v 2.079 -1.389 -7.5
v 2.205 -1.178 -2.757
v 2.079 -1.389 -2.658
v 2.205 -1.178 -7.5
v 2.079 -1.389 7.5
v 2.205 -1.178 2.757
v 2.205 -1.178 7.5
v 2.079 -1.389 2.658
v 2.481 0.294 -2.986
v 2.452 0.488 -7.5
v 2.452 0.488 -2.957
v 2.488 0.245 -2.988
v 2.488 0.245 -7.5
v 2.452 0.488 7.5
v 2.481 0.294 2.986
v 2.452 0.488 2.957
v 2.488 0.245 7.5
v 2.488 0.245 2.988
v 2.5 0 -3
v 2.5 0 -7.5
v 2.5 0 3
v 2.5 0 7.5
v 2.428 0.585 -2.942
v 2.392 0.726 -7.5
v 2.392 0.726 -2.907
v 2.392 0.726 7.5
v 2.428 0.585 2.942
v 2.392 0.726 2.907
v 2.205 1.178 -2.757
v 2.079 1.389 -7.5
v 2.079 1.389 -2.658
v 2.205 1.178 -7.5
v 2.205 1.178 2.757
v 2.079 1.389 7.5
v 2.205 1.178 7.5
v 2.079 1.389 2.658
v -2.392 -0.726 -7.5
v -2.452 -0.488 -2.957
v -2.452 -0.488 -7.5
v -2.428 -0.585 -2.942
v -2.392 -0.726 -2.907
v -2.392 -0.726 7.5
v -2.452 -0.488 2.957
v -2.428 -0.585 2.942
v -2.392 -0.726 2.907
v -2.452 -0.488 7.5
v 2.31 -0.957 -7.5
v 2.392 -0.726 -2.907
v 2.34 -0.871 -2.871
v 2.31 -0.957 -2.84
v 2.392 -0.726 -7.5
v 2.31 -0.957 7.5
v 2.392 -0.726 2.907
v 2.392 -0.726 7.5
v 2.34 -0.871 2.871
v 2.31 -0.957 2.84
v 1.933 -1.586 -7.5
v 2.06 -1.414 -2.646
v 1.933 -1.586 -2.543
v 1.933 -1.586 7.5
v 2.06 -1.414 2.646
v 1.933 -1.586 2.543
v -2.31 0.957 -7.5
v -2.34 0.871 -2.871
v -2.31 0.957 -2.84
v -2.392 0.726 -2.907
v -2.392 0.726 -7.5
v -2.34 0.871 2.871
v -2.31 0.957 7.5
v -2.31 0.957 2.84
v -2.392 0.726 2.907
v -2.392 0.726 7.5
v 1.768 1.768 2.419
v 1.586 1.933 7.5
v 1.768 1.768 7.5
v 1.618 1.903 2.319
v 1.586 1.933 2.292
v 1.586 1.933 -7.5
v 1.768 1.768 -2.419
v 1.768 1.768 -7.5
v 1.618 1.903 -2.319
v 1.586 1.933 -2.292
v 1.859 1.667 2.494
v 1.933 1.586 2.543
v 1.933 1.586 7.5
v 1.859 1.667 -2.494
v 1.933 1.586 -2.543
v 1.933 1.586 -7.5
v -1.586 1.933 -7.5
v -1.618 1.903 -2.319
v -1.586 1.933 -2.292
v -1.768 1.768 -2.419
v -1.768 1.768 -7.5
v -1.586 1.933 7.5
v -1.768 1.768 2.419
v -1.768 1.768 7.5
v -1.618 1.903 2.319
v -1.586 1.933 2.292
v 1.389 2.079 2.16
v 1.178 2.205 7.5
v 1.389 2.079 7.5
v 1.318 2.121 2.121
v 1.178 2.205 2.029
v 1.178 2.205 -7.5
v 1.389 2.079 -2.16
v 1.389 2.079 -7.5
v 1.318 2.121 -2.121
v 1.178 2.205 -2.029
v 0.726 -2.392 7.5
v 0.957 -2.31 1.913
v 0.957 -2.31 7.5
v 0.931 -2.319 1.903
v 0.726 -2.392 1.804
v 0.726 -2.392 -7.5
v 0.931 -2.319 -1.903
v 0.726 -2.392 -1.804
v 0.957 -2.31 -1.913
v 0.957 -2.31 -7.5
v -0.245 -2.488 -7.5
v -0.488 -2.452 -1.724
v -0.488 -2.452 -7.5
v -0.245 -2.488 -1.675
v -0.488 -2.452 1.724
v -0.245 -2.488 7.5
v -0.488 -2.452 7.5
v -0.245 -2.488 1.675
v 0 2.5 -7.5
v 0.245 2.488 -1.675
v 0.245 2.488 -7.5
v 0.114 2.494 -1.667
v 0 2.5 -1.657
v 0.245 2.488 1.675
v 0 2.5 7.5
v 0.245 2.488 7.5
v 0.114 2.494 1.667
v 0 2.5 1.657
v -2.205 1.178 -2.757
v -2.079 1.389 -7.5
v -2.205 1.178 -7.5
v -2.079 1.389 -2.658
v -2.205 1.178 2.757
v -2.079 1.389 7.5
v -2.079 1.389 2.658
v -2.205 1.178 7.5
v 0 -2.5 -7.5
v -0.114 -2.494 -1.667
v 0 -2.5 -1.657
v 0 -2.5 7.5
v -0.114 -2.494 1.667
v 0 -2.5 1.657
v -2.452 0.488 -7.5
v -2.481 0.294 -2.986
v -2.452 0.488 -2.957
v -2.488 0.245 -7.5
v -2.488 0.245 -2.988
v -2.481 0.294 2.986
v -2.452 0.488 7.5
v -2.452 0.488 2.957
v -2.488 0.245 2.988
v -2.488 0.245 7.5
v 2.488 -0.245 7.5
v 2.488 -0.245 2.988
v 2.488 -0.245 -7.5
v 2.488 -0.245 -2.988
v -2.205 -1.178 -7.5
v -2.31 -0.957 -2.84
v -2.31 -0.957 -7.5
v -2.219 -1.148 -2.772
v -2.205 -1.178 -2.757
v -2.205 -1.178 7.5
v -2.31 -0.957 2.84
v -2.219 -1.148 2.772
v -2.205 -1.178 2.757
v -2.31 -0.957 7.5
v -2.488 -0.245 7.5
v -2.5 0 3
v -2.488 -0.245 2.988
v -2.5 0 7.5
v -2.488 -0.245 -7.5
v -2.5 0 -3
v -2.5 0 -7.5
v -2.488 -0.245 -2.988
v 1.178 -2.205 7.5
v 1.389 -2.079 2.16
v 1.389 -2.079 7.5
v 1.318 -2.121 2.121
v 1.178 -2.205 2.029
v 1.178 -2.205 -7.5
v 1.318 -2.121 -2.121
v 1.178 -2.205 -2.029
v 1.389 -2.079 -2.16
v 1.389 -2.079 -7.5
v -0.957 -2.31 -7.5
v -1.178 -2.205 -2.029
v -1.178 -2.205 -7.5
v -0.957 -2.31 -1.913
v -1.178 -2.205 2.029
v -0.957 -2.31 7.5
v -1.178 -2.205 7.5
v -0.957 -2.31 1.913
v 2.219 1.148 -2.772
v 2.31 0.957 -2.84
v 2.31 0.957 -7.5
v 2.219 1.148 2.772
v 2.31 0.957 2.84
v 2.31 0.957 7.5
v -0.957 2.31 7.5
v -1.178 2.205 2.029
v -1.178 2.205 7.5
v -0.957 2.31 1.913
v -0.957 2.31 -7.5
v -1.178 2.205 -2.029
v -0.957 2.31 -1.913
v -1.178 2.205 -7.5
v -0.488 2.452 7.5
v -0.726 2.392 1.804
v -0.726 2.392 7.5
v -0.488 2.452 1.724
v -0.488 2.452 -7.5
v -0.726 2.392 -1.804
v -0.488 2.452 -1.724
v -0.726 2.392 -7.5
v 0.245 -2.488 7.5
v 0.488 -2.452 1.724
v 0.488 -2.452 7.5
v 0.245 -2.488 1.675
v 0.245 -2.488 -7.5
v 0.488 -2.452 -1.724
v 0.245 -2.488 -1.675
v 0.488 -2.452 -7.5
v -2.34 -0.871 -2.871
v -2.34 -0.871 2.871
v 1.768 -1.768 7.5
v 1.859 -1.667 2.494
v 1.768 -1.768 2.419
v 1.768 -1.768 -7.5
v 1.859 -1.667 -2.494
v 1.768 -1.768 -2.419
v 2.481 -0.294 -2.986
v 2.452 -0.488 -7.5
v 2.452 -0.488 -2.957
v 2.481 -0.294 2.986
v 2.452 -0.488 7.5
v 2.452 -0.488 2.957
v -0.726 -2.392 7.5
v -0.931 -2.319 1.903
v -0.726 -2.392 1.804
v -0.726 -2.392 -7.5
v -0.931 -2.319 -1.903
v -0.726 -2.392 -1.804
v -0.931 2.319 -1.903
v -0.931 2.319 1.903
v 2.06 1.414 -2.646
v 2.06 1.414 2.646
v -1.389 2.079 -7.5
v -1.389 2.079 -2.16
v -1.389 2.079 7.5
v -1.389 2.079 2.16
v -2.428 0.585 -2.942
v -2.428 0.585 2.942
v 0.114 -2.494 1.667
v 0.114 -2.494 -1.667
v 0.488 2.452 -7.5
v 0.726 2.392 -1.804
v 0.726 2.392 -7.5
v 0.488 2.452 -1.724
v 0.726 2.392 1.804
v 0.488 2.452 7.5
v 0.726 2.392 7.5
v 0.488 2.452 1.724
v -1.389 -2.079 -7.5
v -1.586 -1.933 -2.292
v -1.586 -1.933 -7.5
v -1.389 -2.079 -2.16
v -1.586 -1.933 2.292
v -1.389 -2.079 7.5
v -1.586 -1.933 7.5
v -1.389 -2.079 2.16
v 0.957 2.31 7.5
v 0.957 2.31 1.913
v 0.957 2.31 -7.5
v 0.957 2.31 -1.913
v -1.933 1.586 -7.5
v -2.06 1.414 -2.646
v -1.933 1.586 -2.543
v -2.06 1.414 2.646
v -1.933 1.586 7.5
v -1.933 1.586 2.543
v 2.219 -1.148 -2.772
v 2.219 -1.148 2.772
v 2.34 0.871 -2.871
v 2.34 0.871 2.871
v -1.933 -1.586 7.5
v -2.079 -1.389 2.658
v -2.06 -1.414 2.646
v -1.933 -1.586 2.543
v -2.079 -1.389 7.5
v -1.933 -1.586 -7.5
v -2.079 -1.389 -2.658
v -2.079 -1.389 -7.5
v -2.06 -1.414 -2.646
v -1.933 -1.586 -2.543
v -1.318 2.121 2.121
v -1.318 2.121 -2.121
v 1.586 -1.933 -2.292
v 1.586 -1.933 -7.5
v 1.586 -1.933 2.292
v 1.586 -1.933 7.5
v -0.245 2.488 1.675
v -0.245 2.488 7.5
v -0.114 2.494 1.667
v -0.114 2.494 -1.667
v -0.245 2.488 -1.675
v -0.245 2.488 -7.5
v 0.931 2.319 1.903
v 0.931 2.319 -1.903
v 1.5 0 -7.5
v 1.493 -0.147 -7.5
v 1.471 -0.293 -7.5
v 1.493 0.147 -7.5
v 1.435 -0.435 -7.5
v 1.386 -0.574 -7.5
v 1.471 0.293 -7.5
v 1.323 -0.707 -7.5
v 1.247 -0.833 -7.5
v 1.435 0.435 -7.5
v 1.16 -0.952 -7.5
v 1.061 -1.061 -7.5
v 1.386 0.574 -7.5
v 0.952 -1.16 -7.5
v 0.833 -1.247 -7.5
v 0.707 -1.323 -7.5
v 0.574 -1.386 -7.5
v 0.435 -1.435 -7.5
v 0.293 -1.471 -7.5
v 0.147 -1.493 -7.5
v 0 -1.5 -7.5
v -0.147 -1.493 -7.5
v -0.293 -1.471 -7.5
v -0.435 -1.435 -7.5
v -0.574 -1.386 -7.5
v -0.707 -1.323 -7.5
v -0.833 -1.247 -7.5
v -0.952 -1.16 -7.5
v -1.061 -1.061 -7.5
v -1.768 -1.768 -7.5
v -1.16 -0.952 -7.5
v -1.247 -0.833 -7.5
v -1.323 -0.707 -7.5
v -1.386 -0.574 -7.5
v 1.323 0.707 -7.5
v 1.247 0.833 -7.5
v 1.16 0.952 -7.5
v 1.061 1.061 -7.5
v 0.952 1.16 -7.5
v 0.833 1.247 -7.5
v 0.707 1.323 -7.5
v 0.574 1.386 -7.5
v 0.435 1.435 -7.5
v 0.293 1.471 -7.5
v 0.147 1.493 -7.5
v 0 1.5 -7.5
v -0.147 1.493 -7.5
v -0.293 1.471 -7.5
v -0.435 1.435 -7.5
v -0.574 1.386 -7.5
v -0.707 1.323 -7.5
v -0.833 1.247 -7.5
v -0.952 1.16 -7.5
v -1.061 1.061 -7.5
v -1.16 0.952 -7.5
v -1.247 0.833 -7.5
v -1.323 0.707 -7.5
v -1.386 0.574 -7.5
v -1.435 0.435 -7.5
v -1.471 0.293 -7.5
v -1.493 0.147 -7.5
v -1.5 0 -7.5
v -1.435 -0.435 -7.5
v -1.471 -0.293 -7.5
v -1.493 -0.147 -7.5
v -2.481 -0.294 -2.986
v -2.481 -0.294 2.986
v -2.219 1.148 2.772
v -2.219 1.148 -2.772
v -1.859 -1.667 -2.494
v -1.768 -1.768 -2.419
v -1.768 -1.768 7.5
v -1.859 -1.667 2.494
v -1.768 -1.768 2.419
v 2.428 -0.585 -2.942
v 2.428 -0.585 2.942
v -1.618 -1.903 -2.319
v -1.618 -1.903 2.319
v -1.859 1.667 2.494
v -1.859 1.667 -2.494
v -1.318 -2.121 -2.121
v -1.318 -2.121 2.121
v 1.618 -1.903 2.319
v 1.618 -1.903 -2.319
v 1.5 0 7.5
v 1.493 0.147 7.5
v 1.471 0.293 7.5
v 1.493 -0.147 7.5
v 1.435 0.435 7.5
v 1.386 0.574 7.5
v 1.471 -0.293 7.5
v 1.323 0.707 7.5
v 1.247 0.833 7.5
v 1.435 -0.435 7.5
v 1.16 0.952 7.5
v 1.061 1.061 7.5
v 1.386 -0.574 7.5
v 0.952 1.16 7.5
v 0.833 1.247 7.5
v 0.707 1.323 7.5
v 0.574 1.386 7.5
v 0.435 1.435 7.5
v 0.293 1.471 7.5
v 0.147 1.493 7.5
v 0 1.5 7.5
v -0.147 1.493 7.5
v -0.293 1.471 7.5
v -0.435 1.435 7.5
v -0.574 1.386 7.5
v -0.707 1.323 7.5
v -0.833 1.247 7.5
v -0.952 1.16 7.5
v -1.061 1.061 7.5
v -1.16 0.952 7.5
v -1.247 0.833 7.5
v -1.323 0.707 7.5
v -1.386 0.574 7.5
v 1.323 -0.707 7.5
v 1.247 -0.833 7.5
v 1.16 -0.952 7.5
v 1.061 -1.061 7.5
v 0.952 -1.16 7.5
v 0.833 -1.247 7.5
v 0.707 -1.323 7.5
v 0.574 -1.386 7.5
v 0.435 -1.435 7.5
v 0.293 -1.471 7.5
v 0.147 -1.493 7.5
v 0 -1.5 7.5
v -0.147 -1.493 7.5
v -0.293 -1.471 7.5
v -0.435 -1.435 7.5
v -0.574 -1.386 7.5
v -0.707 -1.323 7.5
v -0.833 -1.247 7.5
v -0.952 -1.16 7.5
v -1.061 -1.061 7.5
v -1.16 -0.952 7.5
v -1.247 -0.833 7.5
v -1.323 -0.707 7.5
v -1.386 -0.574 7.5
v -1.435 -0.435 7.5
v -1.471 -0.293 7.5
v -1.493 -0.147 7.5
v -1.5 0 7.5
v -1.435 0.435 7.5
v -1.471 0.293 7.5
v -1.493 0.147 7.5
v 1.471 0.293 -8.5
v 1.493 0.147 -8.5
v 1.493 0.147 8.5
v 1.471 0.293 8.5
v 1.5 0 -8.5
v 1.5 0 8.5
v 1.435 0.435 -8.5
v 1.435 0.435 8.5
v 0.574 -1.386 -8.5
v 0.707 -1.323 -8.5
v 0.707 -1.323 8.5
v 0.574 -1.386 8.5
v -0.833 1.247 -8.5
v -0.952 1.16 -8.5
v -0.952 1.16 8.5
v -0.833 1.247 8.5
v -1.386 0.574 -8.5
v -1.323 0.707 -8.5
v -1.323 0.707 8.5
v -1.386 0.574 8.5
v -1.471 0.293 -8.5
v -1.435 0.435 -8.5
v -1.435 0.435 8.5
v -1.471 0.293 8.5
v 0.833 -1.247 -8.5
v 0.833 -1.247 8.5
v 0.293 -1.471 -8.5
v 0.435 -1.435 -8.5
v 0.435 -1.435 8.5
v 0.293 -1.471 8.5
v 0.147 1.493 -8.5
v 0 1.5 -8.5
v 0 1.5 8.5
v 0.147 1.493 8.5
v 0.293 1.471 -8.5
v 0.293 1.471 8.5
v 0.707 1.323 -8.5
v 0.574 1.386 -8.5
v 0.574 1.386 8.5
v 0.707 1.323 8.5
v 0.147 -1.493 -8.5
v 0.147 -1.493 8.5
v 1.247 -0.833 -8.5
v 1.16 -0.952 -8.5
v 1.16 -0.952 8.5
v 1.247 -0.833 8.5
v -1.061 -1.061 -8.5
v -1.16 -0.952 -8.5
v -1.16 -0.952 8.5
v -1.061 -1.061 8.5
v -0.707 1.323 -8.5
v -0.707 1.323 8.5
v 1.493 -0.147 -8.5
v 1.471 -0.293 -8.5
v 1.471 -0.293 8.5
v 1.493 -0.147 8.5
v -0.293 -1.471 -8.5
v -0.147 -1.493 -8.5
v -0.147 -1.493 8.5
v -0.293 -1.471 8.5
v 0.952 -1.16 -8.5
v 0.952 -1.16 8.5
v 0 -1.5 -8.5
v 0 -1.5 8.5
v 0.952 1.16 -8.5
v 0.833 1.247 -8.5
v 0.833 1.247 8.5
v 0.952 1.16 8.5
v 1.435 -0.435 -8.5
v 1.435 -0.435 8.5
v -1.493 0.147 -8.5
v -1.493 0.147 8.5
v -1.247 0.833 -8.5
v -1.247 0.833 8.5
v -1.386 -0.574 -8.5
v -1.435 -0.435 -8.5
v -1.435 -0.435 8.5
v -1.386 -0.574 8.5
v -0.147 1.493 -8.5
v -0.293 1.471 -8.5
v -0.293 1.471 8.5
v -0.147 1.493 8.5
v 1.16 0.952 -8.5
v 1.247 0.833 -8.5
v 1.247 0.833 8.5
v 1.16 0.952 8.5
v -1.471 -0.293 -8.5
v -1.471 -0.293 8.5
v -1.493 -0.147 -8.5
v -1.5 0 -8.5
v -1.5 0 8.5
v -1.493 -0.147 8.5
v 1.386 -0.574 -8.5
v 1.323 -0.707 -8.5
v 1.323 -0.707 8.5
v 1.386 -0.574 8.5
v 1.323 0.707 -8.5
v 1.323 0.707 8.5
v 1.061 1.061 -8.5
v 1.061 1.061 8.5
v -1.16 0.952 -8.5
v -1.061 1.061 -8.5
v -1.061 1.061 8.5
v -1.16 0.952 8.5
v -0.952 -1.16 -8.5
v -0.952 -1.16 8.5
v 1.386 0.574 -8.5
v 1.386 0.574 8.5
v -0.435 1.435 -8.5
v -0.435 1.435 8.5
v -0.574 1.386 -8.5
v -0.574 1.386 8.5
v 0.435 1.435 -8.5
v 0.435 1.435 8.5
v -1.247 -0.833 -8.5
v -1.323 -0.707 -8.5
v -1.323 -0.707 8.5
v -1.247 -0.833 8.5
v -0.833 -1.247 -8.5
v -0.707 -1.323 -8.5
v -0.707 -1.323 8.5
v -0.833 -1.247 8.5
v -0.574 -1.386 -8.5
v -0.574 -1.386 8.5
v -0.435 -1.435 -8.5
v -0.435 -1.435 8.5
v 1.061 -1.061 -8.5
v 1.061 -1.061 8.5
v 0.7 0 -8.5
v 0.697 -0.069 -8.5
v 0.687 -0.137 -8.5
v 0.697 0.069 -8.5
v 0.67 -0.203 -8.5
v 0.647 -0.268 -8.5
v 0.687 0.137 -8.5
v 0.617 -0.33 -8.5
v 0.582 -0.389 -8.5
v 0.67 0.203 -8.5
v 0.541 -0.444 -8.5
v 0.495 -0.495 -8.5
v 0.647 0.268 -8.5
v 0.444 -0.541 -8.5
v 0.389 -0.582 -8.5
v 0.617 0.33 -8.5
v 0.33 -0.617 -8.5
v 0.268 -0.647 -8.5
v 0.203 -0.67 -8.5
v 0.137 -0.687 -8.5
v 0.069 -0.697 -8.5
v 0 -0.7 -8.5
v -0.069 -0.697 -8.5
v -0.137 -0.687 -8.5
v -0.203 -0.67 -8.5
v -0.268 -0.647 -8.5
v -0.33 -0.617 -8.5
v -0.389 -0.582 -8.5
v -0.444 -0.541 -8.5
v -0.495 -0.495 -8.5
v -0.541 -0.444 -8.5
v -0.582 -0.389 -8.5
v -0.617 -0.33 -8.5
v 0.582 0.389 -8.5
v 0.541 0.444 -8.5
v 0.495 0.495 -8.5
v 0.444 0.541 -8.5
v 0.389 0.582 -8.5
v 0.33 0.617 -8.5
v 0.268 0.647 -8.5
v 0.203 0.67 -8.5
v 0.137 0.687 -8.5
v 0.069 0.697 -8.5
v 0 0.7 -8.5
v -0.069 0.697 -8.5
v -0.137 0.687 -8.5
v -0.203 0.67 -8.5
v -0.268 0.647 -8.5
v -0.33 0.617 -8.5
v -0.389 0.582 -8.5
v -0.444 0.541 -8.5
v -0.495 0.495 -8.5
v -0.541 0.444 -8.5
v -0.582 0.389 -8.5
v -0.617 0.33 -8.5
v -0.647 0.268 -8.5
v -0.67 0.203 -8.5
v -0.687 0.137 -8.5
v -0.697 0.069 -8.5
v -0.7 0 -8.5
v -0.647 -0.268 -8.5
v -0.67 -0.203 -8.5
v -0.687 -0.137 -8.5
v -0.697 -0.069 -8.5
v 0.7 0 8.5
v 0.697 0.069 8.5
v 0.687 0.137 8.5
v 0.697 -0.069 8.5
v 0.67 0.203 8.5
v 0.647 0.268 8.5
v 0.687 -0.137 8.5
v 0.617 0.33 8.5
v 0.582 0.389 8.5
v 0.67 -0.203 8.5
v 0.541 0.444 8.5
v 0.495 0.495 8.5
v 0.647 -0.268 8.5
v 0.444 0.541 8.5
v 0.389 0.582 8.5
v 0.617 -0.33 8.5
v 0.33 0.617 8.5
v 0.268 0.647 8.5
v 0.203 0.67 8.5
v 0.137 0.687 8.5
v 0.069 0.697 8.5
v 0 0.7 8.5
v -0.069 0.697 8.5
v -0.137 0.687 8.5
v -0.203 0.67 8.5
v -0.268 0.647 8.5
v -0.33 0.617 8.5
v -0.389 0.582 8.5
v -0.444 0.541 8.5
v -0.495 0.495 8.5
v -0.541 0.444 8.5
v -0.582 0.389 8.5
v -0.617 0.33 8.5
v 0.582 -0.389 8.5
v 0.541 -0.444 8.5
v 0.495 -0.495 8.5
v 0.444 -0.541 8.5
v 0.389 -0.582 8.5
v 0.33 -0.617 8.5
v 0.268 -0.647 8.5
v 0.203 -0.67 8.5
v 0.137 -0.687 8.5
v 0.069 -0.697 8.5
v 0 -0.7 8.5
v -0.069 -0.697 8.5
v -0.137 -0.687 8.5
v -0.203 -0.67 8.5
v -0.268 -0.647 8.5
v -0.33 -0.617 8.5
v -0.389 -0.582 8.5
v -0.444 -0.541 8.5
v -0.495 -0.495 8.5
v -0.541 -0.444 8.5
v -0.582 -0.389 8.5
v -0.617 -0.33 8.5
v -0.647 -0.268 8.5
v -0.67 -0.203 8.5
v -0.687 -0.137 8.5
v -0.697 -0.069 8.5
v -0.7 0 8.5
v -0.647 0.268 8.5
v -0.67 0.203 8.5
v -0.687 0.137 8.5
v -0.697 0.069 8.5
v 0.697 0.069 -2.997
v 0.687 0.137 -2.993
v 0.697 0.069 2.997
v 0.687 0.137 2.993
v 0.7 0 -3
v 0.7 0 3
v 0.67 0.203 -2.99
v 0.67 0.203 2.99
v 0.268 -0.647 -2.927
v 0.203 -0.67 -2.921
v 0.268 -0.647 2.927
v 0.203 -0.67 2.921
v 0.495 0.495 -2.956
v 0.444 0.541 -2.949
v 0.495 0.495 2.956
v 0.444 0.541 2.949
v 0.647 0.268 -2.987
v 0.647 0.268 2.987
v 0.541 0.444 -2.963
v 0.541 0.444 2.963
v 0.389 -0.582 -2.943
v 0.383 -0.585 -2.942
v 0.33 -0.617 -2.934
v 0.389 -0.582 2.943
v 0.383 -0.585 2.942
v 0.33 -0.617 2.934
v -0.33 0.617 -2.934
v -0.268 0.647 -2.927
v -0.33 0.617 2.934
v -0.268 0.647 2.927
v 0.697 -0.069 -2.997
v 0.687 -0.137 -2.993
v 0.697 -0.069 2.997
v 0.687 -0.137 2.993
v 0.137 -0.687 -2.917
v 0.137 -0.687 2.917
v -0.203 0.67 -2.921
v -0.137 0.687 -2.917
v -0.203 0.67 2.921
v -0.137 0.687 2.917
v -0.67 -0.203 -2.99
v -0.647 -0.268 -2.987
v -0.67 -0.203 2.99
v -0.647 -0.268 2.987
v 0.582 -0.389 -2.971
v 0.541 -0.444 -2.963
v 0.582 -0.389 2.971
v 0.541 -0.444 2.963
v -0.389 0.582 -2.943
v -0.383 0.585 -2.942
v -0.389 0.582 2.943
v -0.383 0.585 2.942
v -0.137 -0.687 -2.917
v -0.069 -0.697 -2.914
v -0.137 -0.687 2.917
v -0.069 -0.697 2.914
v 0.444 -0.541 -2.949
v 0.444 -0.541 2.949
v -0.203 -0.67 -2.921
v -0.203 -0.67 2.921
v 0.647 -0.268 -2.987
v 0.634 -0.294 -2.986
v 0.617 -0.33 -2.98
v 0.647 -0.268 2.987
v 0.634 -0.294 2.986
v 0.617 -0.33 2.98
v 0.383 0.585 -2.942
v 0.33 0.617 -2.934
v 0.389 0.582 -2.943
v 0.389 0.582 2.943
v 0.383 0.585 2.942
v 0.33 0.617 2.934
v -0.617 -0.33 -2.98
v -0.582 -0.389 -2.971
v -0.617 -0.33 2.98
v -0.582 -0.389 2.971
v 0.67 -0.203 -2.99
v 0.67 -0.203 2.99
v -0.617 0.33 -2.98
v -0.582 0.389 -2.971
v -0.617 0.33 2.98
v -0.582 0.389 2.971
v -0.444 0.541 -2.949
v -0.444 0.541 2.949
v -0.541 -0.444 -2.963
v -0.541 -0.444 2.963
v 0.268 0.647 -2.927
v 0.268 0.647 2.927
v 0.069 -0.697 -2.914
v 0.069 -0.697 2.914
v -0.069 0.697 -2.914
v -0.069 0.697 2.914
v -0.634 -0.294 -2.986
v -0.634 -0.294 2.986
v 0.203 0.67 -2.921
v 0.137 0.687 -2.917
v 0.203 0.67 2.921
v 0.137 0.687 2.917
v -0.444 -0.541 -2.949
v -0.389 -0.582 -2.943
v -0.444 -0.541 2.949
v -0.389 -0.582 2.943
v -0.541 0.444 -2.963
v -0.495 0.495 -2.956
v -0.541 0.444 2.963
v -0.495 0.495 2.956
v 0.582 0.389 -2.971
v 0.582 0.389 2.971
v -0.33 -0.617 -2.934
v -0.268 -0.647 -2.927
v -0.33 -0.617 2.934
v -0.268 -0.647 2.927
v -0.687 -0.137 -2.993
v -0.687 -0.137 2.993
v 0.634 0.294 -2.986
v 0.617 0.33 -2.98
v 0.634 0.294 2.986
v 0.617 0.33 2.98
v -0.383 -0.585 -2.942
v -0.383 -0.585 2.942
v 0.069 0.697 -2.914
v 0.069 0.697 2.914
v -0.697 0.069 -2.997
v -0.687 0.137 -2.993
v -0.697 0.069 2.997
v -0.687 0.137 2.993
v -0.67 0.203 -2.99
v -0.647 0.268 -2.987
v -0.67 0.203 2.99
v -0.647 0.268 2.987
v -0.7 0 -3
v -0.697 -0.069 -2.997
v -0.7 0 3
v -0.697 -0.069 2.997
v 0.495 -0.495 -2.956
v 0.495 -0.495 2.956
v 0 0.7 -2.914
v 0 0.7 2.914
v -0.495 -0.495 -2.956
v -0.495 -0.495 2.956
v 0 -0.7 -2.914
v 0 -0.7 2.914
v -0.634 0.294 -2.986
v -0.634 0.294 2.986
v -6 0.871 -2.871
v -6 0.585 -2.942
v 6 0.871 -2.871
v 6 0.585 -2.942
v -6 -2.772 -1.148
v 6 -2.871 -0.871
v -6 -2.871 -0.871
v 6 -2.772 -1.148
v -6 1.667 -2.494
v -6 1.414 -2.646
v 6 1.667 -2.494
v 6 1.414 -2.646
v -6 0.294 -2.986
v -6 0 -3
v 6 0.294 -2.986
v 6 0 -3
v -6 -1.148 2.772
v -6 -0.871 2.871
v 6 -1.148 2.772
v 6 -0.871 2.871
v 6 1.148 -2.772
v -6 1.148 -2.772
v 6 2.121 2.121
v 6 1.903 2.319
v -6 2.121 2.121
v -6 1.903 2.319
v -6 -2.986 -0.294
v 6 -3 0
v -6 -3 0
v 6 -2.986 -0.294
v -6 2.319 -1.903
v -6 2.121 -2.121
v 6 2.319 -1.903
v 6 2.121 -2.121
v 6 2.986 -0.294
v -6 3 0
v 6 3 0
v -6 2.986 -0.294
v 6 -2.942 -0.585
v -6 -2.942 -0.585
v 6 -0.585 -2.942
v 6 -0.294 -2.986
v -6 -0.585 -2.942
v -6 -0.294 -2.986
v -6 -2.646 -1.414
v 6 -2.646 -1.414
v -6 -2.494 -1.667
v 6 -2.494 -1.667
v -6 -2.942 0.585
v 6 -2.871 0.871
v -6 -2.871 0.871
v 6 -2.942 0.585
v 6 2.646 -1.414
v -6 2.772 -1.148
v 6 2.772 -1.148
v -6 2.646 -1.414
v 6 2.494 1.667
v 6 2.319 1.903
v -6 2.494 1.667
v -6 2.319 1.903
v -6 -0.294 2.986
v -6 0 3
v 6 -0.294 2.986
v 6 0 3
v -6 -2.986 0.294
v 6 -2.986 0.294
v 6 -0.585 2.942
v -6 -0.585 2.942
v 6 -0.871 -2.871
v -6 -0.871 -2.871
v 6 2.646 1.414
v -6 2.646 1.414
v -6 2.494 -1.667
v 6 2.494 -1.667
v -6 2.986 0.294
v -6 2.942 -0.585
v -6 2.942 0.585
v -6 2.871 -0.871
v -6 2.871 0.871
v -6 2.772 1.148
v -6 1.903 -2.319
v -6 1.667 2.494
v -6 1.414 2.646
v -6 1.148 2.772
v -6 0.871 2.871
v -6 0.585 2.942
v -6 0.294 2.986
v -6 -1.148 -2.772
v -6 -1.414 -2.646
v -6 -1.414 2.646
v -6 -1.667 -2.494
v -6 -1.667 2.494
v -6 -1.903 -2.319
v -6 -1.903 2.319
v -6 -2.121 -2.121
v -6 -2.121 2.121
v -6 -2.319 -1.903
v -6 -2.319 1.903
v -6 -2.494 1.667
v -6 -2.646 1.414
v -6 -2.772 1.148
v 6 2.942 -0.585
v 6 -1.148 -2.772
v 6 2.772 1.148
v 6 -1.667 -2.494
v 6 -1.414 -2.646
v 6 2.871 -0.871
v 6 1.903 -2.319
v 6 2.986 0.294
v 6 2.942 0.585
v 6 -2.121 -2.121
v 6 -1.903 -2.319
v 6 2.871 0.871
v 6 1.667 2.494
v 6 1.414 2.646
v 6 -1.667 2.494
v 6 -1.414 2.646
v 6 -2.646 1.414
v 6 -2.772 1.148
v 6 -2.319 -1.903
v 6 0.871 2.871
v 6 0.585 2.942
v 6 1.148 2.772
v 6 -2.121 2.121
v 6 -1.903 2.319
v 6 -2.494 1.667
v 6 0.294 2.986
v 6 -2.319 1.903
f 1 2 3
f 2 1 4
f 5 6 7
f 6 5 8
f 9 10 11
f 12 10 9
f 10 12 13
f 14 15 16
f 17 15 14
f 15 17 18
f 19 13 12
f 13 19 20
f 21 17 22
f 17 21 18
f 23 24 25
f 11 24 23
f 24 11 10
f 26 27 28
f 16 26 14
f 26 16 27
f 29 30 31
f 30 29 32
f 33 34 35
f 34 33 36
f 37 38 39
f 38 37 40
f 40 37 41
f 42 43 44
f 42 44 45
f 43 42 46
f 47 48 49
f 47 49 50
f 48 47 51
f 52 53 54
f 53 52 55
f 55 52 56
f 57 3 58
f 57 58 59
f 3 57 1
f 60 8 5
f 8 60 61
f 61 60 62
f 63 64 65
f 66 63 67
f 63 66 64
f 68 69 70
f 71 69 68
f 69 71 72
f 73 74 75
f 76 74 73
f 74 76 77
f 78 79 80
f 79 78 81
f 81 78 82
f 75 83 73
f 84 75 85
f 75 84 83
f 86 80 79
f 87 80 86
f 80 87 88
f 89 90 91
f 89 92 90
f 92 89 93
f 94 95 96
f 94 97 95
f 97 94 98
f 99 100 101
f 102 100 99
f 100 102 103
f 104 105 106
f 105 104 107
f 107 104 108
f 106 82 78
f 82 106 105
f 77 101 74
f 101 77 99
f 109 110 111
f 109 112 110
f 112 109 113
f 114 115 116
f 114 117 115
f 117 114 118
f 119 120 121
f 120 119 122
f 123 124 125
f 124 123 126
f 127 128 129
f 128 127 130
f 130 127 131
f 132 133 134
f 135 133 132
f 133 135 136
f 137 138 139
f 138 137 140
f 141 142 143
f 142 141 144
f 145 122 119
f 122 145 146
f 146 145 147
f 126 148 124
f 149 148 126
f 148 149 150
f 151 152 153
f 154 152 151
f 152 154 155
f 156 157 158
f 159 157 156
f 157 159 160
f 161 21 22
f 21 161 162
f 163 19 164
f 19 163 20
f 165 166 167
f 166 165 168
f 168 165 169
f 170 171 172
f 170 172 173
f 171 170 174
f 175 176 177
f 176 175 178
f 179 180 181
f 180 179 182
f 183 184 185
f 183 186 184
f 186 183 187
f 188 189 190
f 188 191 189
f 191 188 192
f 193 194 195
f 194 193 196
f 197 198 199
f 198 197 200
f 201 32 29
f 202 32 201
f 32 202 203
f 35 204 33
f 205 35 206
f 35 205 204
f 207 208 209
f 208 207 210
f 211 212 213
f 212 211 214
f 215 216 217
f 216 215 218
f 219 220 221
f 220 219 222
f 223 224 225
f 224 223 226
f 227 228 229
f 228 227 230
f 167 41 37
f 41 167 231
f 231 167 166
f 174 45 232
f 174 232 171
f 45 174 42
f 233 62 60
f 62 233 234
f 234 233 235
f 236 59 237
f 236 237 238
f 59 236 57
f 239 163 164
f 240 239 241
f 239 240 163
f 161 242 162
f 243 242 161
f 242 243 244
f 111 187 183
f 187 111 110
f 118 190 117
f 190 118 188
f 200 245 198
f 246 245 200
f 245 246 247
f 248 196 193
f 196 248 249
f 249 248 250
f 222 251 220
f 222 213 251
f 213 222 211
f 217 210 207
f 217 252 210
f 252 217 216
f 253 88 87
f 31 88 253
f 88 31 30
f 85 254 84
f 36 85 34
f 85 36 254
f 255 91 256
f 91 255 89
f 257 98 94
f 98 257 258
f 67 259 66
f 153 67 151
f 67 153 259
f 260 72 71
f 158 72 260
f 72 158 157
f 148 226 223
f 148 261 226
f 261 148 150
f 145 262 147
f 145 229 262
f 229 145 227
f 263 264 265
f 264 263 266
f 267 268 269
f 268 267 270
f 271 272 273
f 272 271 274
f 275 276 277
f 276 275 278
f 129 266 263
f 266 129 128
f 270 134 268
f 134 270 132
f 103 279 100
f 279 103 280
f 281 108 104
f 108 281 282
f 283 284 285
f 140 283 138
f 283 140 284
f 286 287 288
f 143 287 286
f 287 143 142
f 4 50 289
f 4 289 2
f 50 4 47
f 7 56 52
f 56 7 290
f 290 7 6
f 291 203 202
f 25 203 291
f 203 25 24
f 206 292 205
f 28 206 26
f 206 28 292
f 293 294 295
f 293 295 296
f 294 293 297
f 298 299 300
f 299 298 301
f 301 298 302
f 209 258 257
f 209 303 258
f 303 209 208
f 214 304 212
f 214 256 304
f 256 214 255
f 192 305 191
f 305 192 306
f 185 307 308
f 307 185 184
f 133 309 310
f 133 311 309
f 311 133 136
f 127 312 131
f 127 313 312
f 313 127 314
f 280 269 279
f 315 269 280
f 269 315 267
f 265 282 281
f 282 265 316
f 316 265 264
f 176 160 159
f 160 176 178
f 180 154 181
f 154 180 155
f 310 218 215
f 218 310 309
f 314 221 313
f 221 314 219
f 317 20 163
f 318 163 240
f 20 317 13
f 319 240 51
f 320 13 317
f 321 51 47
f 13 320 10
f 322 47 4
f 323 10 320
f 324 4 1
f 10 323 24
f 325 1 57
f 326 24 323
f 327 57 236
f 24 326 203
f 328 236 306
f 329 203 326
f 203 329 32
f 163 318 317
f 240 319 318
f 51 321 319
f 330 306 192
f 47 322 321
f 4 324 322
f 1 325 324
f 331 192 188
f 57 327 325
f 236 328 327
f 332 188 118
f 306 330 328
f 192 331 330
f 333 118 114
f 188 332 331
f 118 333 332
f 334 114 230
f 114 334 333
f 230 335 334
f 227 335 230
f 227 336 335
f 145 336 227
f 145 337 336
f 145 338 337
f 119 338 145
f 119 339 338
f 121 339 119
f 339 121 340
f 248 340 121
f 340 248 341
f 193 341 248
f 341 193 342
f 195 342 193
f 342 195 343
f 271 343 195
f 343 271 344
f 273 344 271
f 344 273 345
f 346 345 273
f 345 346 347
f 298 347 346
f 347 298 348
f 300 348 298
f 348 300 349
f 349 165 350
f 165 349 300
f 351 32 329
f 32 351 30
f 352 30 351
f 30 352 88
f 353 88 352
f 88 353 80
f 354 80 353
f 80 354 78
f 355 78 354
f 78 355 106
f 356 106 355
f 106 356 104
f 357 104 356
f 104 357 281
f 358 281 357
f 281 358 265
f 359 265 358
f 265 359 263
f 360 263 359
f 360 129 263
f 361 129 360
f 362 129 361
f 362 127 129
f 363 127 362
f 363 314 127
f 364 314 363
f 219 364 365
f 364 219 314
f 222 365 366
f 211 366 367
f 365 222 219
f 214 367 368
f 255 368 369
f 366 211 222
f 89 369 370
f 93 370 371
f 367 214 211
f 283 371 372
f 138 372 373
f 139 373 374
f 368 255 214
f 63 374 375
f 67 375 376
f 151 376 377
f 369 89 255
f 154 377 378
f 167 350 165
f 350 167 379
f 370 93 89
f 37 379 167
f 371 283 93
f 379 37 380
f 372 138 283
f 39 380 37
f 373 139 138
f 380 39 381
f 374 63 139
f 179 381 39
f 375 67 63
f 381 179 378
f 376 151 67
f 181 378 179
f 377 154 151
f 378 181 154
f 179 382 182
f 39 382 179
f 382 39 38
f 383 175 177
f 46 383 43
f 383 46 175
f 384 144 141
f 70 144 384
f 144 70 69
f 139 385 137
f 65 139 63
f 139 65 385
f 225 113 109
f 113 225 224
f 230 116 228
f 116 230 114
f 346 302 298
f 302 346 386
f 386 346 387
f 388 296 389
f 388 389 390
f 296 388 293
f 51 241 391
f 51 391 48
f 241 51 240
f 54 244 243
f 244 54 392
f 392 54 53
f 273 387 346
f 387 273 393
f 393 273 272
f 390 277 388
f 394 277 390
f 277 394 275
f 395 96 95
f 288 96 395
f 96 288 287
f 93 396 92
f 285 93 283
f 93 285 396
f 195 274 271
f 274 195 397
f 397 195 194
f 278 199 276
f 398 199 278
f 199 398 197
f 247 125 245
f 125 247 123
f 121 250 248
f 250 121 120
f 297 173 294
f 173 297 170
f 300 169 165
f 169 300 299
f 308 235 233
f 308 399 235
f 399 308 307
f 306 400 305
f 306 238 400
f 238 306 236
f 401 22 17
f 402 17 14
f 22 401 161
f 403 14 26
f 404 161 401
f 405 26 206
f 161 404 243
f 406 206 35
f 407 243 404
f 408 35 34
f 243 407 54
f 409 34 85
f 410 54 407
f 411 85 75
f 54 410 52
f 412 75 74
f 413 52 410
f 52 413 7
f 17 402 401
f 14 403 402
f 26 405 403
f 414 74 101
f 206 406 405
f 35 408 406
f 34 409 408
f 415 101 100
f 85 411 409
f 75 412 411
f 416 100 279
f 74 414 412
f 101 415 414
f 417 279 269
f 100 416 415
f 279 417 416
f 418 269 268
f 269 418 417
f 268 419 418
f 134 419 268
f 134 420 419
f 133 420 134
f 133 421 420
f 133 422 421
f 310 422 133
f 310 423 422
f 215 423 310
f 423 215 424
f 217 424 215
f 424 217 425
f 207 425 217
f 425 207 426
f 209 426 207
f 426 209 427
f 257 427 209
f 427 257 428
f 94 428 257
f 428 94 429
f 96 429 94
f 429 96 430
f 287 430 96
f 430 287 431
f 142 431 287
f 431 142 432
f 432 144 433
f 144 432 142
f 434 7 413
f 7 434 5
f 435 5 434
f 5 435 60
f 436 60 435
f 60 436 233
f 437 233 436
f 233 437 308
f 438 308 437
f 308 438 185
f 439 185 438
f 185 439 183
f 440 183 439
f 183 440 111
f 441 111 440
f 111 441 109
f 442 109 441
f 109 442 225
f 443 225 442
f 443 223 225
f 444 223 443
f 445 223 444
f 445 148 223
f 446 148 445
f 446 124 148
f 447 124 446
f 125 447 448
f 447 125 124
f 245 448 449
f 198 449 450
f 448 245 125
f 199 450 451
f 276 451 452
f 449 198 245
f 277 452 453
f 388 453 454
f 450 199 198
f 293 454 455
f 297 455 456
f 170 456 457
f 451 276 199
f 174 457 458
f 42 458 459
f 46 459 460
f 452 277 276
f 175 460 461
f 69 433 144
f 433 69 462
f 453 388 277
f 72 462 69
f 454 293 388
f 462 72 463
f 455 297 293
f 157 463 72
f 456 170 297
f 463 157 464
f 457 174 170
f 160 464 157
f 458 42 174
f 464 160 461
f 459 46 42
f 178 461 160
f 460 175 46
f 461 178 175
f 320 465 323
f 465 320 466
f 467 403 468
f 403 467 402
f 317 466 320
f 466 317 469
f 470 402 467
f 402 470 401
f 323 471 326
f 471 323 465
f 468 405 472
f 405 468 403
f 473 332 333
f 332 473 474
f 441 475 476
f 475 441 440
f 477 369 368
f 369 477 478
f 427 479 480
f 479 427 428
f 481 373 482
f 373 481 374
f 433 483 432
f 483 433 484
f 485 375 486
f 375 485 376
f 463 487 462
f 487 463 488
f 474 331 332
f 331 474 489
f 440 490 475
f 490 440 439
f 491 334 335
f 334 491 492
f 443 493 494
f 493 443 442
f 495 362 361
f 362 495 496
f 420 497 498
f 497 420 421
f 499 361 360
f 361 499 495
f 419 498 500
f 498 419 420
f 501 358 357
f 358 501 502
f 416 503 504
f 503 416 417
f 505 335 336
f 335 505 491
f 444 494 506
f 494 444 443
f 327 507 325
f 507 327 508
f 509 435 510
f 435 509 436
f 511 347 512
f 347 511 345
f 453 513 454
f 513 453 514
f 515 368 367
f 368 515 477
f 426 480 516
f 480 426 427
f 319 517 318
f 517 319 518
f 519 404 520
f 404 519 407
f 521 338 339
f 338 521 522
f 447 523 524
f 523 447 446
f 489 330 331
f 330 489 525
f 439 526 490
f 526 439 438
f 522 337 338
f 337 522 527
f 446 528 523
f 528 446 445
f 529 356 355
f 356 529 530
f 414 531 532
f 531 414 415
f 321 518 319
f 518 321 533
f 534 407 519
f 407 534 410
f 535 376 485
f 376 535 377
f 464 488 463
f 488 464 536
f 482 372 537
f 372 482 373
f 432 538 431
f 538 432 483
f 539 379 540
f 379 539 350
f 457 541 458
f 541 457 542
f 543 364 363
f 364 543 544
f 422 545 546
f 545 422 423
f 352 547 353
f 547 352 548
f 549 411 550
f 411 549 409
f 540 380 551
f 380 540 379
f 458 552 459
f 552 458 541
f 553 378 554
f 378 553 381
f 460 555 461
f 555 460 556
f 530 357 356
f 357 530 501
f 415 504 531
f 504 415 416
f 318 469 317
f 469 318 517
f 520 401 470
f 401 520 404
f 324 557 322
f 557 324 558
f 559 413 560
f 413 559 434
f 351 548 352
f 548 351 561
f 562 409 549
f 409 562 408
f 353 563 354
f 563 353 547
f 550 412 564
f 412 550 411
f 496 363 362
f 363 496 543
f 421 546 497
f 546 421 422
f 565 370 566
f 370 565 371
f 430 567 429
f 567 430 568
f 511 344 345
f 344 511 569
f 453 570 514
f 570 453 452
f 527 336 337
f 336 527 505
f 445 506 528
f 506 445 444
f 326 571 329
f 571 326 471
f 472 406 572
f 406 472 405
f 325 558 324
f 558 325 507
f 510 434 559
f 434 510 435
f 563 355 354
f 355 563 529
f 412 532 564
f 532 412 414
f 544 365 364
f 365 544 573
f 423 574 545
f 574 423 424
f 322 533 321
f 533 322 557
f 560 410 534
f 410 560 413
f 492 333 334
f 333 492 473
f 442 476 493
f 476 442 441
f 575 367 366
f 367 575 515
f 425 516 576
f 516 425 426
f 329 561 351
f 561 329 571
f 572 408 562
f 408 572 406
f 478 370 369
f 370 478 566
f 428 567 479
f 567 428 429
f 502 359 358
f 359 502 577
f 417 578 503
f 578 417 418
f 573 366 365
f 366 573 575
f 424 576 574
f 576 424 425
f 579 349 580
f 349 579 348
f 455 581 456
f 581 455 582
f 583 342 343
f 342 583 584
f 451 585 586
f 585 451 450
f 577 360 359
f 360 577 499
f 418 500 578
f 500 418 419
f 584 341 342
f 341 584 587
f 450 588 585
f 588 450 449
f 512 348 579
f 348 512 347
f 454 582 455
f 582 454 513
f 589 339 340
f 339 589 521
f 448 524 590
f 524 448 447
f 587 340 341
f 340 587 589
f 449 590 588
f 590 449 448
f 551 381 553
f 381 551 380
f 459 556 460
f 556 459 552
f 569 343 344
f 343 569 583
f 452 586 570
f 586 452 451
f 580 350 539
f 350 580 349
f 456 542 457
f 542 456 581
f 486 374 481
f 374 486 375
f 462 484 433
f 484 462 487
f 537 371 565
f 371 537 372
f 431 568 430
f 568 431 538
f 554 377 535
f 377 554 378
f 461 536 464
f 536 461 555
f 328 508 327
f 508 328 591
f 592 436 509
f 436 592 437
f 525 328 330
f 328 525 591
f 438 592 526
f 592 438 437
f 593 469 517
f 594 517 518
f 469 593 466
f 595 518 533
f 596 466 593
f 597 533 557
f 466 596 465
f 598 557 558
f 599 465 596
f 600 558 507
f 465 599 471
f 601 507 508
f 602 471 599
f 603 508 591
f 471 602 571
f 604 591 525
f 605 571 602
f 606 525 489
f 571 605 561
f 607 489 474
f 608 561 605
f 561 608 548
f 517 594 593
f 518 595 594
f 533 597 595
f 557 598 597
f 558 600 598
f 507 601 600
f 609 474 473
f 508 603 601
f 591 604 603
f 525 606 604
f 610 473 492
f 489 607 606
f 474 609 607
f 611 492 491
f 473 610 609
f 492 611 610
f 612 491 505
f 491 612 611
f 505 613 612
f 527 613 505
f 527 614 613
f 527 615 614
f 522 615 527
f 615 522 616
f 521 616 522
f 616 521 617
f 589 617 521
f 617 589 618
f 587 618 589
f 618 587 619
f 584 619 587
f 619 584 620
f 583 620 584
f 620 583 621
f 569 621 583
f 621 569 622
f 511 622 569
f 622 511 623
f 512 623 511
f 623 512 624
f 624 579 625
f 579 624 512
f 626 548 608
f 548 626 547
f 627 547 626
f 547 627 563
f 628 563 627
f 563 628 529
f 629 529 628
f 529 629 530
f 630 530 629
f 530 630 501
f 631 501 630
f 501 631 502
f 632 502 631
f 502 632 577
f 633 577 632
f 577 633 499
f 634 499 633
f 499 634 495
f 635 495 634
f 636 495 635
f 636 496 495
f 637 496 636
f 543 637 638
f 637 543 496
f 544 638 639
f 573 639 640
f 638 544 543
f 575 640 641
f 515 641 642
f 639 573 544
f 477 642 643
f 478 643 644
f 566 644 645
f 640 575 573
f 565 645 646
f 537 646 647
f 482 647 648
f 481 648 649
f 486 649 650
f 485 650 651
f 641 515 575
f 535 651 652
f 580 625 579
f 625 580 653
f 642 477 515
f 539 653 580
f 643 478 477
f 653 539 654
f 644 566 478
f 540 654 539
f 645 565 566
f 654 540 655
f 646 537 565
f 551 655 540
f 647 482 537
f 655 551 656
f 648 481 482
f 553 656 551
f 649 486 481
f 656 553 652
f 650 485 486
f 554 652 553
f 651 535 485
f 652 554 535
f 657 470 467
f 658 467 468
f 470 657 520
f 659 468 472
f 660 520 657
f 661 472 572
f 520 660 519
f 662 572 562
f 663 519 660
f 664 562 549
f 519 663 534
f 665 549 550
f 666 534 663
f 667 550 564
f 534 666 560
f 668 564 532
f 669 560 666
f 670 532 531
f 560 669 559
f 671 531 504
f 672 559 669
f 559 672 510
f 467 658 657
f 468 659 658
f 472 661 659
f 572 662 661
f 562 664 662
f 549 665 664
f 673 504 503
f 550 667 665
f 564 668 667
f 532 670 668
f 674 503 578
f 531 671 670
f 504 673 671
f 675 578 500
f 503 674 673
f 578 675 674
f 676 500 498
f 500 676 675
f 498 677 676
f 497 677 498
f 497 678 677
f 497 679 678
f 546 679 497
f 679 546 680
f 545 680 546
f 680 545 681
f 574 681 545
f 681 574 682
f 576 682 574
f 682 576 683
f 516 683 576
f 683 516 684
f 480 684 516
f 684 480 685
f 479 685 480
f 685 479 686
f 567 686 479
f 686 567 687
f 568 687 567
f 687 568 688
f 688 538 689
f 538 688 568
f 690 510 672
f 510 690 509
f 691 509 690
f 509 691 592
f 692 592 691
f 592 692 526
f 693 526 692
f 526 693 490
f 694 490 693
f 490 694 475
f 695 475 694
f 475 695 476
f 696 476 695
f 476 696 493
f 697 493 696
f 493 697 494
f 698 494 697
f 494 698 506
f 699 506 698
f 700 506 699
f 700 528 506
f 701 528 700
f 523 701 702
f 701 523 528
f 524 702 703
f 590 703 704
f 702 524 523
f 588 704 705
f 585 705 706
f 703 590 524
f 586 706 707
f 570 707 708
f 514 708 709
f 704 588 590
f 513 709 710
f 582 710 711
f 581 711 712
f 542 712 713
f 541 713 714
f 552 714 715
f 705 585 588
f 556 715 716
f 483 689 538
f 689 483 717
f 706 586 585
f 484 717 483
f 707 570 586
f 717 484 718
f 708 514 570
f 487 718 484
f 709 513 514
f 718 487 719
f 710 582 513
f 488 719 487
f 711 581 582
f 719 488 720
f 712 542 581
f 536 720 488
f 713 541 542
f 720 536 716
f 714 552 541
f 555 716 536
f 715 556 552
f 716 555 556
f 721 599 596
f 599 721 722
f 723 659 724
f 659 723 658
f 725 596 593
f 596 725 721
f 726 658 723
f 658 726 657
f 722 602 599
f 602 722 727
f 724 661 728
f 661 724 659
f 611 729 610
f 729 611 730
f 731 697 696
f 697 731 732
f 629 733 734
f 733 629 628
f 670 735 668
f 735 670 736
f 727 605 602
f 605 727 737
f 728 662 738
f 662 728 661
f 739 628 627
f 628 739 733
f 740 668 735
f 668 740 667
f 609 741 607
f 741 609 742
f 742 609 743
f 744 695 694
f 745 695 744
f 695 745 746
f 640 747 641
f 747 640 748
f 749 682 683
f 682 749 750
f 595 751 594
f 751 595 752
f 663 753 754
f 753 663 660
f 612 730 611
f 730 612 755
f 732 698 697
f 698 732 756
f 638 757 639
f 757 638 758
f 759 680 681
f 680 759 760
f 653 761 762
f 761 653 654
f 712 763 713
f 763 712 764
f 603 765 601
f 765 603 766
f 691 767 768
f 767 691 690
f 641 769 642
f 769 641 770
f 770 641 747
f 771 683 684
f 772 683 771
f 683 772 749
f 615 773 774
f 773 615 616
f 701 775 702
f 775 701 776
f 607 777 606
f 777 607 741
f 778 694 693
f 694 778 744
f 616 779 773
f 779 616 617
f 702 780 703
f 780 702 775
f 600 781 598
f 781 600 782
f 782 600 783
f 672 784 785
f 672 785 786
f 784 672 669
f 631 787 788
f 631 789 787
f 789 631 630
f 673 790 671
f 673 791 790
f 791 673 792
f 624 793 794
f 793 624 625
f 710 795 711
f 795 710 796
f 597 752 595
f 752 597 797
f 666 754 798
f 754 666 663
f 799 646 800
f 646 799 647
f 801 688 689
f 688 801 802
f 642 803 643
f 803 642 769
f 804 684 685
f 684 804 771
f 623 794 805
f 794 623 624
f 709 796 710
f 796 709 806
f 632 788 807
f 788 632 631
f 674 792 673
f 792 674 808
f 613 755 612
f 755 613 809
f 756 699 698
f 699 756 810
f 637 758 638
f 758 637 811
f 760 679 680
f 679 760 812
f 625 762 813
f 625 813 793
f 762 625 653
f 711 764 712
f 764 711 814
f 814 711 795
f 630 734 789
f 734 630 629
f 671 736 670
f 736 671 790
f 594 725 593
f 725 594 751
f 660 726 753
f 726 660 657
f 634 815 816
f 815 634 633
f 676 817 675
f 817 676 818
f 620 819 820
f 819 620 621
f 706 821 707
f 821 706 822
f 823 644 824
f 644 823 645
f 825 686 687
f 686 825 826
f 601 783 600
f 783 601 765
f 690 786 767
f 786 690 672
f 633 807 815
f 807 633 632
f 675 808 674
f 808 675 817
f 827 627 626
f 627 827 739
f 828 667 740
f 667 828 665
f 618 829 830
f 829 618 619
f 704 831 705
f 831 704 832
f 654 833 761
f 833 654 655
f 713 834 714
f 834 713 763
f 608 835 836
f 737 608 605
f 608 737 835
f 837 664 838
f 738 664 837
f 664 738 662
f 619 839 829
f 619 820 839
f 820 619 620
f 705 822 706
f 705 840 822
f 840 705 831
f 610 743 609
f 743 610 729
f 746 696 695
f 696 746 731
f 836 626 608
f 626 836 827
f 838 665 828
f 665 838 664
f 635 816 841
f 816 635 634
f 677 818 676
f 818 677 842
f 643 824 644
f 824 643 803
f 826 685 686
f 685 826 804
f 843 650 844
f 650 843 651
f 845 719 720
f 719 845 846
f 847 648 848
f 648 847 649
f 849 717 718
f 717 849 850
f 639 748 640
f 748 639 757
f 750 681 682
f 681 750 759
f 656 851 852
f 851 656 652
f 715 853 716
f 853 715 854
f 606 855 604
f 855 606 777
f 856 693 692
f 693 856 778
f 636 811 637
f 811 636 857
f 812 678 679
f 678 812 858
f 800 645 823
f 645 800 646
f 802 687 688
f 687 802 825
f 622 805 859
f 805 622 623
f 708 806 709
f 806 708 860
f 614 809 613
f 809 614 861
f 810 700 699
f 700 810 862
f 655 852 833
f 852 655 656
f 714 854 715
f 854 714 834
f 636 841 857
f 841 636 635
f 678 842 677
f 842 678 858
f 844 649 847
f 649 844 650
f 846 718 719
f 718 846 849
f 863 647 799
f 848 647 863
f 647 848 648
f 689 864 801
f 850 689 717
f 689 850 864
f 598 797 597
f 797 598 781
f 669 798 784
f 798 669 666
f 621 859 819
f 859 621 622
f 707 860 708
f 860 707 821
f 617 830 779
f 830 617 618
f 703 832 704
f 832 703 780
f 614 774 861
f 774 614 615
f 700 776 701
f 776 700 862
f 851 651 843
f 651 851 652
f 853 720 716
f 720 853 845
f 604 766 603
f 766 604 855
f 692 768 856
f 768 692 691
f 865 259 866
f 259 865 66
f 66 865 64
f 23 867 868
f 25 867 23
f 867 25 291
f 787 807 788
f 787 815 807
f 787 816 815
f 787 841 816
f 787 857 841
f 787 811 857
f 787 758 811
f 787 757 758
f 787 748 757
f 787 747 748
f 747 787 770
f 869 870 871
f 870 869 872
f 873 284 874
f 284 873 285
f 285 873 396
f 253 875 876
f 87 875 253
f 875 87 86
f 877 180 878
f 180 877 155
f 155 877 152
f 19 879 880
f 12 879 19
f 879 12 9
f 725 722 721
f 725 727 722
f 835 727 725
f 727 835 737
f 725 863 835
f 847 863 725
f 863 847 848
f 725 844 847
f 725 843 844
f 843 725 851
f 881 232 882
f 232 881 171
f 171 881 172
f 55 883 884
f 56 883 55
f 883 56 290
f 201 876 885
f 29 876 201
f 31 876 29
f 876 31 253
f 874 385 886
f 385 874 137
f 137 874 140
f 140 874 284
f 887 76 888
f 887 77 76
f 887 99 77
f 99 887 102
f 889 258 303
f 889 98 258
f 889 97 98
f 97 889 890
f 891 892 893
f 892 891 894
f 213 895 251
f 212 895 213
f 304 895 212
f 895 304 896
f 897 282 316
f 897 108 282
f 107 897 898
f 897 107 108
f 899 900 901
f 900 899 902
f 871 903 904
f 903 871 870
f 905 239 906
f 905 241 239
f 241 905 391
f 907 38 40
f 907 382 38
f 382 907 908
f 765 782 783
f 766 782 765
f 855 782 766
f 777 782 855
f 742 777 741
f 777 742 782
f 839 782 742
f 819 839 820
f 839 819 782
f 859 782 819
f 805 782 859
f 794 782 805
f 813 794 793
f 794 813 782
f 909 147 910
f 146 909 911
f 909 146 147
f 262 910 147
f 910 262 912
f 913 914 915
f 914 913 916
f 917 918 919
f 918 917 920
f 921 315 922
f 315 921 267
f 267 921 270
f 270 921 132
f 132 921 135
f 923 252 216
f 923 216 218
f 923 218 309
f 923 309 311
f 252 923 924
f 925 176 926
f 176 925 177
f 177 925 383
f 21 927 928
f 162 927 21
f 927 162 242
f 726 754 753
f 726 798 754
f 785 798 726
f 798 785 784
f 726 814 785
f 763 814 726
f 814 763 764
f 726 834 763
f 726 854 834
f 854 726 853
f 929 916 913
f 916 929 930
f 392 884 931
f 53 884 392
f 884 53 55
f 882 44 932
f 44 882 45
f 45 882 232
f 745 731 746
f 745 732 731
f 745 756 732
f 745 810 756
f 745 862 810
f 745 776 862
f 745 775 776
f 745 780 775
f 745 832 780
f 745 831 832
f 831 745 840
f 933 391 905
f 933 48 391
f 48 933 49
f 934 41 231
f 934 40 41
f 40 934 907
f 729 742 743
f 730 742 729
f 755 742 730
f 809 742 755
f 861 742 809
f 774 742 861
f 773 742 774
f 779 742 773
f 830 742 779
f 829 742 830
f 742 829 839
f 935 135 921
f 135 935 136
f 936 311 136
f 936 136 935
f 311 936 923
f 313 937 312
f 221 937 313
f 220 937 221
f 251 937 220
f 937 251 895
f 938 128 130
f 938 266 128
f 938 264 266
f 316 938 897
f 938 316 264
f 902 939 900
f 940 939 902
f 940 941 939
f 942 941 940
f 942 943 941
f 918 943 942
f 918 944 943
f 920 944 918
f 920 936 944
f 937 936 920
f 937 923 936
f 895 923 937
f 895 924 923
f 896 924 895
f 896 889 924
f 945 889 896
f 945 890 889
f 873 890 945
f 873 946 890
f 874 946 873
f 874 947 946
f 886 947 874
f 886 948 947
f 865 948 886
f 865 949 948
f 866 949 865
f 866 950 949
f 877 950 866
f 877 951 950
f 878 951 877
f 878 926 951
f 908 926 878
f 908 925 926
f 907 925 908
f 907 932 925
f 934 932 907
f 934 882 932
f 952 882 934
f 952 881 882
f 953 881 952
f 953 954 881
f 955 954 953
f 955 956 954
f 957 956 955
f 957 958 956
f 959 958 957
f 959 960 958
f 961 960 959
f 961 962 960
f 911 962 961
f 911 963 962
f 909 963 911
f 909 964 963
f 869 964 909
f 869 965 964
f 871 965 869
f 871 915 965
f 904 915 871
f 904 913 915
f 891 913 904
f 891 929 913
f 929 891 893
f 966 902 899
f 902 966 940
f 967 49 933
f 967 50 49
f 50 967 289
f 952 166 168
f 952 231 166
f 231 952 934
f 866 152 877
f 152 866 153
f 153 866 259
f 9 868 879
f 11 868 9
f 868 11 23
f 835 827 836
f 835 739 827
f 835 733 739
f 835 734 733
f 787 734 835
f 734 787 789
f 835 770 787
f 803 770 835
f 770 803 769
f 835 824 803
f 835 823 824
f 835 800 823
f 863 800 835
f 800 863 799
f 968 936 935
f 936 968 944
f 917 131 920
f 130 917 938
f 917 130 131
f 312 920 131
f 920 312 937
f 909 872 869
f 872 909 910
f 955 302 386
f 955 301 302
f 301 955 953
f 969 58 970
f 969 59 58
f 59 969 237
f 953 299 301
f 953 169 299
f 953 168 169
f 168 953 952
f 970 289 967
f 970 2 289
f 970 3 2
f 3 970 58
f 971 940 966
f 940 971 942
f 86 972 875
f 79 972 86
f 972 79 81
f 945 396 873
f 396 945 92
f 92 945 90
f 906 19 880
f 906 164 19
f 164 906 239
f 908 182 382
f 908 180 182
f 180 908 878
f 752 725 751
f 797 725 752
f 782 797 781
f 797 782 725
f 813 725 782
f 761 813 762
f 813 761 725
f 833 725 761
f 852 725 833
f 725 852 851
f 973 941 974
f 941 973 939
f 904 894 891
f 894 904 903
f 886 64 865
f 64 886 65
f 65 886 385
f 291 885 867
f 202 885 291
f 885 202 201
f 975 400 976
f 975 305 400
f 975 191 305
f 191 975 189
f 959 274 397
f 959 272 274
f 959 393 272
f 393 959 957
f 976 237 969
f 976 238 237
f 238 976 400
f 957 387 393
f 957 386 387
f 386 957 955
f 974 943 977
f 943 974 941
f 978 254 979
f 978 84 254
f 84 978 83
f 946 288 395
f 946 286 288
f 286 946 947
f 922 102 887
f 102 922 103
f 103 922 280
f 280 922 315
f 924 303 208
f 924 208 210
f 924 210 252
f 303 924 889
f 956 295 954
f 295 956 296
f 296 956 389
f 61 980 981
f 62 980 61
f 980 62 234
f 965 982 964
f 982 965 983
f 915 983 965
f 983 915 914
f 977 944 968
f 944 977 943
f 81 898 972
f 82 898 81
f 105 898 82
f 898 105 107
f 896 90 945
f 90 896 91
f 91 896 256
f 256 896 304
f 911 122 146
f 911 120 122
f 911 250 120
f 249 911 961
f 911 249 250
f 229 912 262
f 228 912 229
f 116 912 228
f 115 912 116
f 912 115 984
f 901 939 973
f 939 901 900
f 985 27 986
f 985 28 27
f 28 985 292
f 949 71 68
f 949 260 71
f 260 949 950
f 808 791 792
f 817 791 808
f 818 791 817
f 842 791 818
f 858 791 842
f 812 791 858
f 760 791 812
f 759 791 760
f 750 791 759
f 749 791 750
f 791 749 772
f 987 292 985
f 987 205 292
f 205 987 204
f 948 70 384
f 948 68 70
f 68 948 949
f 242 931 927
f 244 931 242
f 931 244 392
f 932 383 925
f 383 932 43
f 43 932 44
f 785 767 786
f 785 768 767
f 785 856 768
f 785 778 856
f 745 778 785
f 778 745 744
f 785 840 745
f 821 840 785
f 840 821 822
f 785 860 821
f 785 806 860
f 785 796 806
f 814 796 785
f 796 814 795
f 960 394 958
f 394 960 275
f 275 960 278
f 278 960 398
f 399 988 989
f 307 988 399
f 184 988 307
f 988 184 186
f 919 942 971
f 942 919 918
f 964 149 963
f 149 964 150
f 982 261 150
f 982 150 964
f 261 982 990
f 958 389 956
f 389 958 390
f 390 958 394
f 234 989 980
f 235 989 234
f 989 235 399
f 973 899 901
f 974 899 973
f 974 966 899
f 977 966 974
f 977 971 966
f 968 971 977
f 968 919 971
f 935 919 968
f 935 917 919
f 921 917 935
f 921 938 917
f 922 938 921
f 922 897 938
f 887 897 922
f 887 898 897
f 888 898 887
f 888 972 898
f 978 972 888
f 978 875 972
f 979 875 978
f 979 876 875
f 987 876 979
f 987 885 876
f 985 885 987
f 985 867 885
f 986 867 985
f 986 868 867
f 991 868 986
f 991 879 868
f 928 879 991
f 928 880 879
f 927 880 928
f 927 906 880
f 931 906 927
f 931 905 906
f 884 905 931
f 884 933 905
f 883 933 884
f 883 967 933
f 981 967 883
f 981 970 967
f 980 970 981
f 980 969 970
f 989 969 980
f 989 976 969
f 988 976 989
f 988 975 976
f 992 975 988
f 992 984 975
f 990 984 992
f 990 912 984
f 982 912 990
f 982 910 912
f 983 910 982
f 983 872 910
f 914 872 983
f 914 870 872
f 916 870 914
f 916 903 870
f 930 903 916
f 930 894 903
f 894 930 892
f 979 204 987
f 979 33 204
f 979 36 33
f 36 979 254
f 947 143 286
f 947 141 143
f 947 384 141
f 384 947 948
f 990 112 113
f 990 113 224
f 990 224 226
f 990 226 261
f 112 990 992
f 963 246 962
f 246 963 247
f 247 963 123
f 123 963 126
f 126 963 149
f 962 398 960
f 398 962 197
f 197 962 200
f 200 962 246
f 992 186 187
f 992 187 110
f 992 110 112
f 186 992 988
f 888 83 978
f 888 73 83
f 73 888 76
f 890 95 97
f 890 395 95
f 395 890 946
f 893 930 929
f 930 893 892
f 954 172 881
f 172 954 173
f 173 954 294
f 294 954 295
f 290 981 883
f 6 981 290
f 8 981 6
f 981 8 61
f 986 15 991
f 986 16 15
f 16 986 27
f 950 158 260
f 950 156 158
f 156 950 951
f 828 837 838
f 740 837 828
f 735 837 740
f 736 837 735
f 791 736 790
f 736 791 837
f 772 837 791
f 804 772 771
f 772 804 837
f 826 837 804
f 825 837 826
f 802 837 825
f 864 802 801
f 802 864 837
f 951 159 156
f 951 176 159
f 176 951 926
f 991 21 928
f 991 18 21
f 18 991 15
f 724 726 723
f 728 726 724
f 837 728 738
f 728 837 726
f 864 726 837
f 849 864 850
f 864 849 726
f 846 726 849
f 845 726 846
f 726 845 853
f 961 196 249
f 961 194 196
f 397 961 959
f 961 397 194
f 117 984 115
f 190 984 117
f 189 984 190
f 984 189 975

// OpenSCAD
// Parameters
length = 15; //[8:30:1]
forced_id = 0; //[0:10:1]
center = true; //[0:1:1]
hs_original_id = 3; //[1.5:6:0.1]
hs_original_od = 5; //[2.5:10:0.1]
hs_id = 3; //[1.5:10:0.1]
hs_od = 5; //[2.5:14:0.1]
eps_overlap = 1; //[0.5:2:0.1]
res_body_d = 6; //[3:12:0.1]
res_body_l = 10; //[5:25:0.1]

$fn = 64;

// Tubing (heatshrink sleeve)
module tubing() {
  color([0.85, 0.85, 0.8])  // Off-white for heatshrink
  difference() {
    cylinder(h=length, r=hs_od/2, center=center);
    cylinder(h=length + 2*eps_overlap, r=hs_id/2, center=center);
  }
}

// Inner tube/liner that MUST be attached to the heatshrink (light gray)
module inner_tube() {
  // Make a thin-walled tube that sits inside the heatshrink and overlaps it axially
  // so it cannot "float" and is clearly united.
  wall = 0.8; // thin liner wall
  r_outer = min(hs_id/2, hs_od/2 - 0.2);          // ensure it fits inside
  r_inner = max(0.1, r_outer - wall);

  // Extend slightly beyond the heatshrink length to guarantee overlap/union
  liner_h = length + 2*eps_overlap;

  color([0.75, 0.75, 0.75])
  difference() {
    cylinder(h=liner_h, r=r_outer, center=center);
    cylinder(h=liner_h + 2*eps_overlap, r=r_inner, center=center);
  }
}

// Resistor body (black) positioned to intersect the heatshrink with overlap
module sleeved_resistor() {
  color([0.2, 0.2, 0.2]) {
    // Resistor axis along X; place it so it passes through the heatshrink
    // and overlaps by eps_overlap to ensure a single connected solid.
    rotate([0, 90, 0]) {
      // Center the resistor on the heatshrink axis (no offset that causes "crossing bodies")
      // and ensure it intersects the sleeve volume.
      translate([0, 0, 0])
        cylinder(h=res_body_l + 2*eps_overlap, r=res_body_d/2, center=true);
    }
  }
}

// Assembly: union into a single connected solid
module assembly() {
  union() {
    tubing();
    inner_tube();        // attached by coaxial overlap inside the sleeve
    sleeved_resistor();  // intersects sleeve with overlap for continuous contact
  }
}

assembly();
